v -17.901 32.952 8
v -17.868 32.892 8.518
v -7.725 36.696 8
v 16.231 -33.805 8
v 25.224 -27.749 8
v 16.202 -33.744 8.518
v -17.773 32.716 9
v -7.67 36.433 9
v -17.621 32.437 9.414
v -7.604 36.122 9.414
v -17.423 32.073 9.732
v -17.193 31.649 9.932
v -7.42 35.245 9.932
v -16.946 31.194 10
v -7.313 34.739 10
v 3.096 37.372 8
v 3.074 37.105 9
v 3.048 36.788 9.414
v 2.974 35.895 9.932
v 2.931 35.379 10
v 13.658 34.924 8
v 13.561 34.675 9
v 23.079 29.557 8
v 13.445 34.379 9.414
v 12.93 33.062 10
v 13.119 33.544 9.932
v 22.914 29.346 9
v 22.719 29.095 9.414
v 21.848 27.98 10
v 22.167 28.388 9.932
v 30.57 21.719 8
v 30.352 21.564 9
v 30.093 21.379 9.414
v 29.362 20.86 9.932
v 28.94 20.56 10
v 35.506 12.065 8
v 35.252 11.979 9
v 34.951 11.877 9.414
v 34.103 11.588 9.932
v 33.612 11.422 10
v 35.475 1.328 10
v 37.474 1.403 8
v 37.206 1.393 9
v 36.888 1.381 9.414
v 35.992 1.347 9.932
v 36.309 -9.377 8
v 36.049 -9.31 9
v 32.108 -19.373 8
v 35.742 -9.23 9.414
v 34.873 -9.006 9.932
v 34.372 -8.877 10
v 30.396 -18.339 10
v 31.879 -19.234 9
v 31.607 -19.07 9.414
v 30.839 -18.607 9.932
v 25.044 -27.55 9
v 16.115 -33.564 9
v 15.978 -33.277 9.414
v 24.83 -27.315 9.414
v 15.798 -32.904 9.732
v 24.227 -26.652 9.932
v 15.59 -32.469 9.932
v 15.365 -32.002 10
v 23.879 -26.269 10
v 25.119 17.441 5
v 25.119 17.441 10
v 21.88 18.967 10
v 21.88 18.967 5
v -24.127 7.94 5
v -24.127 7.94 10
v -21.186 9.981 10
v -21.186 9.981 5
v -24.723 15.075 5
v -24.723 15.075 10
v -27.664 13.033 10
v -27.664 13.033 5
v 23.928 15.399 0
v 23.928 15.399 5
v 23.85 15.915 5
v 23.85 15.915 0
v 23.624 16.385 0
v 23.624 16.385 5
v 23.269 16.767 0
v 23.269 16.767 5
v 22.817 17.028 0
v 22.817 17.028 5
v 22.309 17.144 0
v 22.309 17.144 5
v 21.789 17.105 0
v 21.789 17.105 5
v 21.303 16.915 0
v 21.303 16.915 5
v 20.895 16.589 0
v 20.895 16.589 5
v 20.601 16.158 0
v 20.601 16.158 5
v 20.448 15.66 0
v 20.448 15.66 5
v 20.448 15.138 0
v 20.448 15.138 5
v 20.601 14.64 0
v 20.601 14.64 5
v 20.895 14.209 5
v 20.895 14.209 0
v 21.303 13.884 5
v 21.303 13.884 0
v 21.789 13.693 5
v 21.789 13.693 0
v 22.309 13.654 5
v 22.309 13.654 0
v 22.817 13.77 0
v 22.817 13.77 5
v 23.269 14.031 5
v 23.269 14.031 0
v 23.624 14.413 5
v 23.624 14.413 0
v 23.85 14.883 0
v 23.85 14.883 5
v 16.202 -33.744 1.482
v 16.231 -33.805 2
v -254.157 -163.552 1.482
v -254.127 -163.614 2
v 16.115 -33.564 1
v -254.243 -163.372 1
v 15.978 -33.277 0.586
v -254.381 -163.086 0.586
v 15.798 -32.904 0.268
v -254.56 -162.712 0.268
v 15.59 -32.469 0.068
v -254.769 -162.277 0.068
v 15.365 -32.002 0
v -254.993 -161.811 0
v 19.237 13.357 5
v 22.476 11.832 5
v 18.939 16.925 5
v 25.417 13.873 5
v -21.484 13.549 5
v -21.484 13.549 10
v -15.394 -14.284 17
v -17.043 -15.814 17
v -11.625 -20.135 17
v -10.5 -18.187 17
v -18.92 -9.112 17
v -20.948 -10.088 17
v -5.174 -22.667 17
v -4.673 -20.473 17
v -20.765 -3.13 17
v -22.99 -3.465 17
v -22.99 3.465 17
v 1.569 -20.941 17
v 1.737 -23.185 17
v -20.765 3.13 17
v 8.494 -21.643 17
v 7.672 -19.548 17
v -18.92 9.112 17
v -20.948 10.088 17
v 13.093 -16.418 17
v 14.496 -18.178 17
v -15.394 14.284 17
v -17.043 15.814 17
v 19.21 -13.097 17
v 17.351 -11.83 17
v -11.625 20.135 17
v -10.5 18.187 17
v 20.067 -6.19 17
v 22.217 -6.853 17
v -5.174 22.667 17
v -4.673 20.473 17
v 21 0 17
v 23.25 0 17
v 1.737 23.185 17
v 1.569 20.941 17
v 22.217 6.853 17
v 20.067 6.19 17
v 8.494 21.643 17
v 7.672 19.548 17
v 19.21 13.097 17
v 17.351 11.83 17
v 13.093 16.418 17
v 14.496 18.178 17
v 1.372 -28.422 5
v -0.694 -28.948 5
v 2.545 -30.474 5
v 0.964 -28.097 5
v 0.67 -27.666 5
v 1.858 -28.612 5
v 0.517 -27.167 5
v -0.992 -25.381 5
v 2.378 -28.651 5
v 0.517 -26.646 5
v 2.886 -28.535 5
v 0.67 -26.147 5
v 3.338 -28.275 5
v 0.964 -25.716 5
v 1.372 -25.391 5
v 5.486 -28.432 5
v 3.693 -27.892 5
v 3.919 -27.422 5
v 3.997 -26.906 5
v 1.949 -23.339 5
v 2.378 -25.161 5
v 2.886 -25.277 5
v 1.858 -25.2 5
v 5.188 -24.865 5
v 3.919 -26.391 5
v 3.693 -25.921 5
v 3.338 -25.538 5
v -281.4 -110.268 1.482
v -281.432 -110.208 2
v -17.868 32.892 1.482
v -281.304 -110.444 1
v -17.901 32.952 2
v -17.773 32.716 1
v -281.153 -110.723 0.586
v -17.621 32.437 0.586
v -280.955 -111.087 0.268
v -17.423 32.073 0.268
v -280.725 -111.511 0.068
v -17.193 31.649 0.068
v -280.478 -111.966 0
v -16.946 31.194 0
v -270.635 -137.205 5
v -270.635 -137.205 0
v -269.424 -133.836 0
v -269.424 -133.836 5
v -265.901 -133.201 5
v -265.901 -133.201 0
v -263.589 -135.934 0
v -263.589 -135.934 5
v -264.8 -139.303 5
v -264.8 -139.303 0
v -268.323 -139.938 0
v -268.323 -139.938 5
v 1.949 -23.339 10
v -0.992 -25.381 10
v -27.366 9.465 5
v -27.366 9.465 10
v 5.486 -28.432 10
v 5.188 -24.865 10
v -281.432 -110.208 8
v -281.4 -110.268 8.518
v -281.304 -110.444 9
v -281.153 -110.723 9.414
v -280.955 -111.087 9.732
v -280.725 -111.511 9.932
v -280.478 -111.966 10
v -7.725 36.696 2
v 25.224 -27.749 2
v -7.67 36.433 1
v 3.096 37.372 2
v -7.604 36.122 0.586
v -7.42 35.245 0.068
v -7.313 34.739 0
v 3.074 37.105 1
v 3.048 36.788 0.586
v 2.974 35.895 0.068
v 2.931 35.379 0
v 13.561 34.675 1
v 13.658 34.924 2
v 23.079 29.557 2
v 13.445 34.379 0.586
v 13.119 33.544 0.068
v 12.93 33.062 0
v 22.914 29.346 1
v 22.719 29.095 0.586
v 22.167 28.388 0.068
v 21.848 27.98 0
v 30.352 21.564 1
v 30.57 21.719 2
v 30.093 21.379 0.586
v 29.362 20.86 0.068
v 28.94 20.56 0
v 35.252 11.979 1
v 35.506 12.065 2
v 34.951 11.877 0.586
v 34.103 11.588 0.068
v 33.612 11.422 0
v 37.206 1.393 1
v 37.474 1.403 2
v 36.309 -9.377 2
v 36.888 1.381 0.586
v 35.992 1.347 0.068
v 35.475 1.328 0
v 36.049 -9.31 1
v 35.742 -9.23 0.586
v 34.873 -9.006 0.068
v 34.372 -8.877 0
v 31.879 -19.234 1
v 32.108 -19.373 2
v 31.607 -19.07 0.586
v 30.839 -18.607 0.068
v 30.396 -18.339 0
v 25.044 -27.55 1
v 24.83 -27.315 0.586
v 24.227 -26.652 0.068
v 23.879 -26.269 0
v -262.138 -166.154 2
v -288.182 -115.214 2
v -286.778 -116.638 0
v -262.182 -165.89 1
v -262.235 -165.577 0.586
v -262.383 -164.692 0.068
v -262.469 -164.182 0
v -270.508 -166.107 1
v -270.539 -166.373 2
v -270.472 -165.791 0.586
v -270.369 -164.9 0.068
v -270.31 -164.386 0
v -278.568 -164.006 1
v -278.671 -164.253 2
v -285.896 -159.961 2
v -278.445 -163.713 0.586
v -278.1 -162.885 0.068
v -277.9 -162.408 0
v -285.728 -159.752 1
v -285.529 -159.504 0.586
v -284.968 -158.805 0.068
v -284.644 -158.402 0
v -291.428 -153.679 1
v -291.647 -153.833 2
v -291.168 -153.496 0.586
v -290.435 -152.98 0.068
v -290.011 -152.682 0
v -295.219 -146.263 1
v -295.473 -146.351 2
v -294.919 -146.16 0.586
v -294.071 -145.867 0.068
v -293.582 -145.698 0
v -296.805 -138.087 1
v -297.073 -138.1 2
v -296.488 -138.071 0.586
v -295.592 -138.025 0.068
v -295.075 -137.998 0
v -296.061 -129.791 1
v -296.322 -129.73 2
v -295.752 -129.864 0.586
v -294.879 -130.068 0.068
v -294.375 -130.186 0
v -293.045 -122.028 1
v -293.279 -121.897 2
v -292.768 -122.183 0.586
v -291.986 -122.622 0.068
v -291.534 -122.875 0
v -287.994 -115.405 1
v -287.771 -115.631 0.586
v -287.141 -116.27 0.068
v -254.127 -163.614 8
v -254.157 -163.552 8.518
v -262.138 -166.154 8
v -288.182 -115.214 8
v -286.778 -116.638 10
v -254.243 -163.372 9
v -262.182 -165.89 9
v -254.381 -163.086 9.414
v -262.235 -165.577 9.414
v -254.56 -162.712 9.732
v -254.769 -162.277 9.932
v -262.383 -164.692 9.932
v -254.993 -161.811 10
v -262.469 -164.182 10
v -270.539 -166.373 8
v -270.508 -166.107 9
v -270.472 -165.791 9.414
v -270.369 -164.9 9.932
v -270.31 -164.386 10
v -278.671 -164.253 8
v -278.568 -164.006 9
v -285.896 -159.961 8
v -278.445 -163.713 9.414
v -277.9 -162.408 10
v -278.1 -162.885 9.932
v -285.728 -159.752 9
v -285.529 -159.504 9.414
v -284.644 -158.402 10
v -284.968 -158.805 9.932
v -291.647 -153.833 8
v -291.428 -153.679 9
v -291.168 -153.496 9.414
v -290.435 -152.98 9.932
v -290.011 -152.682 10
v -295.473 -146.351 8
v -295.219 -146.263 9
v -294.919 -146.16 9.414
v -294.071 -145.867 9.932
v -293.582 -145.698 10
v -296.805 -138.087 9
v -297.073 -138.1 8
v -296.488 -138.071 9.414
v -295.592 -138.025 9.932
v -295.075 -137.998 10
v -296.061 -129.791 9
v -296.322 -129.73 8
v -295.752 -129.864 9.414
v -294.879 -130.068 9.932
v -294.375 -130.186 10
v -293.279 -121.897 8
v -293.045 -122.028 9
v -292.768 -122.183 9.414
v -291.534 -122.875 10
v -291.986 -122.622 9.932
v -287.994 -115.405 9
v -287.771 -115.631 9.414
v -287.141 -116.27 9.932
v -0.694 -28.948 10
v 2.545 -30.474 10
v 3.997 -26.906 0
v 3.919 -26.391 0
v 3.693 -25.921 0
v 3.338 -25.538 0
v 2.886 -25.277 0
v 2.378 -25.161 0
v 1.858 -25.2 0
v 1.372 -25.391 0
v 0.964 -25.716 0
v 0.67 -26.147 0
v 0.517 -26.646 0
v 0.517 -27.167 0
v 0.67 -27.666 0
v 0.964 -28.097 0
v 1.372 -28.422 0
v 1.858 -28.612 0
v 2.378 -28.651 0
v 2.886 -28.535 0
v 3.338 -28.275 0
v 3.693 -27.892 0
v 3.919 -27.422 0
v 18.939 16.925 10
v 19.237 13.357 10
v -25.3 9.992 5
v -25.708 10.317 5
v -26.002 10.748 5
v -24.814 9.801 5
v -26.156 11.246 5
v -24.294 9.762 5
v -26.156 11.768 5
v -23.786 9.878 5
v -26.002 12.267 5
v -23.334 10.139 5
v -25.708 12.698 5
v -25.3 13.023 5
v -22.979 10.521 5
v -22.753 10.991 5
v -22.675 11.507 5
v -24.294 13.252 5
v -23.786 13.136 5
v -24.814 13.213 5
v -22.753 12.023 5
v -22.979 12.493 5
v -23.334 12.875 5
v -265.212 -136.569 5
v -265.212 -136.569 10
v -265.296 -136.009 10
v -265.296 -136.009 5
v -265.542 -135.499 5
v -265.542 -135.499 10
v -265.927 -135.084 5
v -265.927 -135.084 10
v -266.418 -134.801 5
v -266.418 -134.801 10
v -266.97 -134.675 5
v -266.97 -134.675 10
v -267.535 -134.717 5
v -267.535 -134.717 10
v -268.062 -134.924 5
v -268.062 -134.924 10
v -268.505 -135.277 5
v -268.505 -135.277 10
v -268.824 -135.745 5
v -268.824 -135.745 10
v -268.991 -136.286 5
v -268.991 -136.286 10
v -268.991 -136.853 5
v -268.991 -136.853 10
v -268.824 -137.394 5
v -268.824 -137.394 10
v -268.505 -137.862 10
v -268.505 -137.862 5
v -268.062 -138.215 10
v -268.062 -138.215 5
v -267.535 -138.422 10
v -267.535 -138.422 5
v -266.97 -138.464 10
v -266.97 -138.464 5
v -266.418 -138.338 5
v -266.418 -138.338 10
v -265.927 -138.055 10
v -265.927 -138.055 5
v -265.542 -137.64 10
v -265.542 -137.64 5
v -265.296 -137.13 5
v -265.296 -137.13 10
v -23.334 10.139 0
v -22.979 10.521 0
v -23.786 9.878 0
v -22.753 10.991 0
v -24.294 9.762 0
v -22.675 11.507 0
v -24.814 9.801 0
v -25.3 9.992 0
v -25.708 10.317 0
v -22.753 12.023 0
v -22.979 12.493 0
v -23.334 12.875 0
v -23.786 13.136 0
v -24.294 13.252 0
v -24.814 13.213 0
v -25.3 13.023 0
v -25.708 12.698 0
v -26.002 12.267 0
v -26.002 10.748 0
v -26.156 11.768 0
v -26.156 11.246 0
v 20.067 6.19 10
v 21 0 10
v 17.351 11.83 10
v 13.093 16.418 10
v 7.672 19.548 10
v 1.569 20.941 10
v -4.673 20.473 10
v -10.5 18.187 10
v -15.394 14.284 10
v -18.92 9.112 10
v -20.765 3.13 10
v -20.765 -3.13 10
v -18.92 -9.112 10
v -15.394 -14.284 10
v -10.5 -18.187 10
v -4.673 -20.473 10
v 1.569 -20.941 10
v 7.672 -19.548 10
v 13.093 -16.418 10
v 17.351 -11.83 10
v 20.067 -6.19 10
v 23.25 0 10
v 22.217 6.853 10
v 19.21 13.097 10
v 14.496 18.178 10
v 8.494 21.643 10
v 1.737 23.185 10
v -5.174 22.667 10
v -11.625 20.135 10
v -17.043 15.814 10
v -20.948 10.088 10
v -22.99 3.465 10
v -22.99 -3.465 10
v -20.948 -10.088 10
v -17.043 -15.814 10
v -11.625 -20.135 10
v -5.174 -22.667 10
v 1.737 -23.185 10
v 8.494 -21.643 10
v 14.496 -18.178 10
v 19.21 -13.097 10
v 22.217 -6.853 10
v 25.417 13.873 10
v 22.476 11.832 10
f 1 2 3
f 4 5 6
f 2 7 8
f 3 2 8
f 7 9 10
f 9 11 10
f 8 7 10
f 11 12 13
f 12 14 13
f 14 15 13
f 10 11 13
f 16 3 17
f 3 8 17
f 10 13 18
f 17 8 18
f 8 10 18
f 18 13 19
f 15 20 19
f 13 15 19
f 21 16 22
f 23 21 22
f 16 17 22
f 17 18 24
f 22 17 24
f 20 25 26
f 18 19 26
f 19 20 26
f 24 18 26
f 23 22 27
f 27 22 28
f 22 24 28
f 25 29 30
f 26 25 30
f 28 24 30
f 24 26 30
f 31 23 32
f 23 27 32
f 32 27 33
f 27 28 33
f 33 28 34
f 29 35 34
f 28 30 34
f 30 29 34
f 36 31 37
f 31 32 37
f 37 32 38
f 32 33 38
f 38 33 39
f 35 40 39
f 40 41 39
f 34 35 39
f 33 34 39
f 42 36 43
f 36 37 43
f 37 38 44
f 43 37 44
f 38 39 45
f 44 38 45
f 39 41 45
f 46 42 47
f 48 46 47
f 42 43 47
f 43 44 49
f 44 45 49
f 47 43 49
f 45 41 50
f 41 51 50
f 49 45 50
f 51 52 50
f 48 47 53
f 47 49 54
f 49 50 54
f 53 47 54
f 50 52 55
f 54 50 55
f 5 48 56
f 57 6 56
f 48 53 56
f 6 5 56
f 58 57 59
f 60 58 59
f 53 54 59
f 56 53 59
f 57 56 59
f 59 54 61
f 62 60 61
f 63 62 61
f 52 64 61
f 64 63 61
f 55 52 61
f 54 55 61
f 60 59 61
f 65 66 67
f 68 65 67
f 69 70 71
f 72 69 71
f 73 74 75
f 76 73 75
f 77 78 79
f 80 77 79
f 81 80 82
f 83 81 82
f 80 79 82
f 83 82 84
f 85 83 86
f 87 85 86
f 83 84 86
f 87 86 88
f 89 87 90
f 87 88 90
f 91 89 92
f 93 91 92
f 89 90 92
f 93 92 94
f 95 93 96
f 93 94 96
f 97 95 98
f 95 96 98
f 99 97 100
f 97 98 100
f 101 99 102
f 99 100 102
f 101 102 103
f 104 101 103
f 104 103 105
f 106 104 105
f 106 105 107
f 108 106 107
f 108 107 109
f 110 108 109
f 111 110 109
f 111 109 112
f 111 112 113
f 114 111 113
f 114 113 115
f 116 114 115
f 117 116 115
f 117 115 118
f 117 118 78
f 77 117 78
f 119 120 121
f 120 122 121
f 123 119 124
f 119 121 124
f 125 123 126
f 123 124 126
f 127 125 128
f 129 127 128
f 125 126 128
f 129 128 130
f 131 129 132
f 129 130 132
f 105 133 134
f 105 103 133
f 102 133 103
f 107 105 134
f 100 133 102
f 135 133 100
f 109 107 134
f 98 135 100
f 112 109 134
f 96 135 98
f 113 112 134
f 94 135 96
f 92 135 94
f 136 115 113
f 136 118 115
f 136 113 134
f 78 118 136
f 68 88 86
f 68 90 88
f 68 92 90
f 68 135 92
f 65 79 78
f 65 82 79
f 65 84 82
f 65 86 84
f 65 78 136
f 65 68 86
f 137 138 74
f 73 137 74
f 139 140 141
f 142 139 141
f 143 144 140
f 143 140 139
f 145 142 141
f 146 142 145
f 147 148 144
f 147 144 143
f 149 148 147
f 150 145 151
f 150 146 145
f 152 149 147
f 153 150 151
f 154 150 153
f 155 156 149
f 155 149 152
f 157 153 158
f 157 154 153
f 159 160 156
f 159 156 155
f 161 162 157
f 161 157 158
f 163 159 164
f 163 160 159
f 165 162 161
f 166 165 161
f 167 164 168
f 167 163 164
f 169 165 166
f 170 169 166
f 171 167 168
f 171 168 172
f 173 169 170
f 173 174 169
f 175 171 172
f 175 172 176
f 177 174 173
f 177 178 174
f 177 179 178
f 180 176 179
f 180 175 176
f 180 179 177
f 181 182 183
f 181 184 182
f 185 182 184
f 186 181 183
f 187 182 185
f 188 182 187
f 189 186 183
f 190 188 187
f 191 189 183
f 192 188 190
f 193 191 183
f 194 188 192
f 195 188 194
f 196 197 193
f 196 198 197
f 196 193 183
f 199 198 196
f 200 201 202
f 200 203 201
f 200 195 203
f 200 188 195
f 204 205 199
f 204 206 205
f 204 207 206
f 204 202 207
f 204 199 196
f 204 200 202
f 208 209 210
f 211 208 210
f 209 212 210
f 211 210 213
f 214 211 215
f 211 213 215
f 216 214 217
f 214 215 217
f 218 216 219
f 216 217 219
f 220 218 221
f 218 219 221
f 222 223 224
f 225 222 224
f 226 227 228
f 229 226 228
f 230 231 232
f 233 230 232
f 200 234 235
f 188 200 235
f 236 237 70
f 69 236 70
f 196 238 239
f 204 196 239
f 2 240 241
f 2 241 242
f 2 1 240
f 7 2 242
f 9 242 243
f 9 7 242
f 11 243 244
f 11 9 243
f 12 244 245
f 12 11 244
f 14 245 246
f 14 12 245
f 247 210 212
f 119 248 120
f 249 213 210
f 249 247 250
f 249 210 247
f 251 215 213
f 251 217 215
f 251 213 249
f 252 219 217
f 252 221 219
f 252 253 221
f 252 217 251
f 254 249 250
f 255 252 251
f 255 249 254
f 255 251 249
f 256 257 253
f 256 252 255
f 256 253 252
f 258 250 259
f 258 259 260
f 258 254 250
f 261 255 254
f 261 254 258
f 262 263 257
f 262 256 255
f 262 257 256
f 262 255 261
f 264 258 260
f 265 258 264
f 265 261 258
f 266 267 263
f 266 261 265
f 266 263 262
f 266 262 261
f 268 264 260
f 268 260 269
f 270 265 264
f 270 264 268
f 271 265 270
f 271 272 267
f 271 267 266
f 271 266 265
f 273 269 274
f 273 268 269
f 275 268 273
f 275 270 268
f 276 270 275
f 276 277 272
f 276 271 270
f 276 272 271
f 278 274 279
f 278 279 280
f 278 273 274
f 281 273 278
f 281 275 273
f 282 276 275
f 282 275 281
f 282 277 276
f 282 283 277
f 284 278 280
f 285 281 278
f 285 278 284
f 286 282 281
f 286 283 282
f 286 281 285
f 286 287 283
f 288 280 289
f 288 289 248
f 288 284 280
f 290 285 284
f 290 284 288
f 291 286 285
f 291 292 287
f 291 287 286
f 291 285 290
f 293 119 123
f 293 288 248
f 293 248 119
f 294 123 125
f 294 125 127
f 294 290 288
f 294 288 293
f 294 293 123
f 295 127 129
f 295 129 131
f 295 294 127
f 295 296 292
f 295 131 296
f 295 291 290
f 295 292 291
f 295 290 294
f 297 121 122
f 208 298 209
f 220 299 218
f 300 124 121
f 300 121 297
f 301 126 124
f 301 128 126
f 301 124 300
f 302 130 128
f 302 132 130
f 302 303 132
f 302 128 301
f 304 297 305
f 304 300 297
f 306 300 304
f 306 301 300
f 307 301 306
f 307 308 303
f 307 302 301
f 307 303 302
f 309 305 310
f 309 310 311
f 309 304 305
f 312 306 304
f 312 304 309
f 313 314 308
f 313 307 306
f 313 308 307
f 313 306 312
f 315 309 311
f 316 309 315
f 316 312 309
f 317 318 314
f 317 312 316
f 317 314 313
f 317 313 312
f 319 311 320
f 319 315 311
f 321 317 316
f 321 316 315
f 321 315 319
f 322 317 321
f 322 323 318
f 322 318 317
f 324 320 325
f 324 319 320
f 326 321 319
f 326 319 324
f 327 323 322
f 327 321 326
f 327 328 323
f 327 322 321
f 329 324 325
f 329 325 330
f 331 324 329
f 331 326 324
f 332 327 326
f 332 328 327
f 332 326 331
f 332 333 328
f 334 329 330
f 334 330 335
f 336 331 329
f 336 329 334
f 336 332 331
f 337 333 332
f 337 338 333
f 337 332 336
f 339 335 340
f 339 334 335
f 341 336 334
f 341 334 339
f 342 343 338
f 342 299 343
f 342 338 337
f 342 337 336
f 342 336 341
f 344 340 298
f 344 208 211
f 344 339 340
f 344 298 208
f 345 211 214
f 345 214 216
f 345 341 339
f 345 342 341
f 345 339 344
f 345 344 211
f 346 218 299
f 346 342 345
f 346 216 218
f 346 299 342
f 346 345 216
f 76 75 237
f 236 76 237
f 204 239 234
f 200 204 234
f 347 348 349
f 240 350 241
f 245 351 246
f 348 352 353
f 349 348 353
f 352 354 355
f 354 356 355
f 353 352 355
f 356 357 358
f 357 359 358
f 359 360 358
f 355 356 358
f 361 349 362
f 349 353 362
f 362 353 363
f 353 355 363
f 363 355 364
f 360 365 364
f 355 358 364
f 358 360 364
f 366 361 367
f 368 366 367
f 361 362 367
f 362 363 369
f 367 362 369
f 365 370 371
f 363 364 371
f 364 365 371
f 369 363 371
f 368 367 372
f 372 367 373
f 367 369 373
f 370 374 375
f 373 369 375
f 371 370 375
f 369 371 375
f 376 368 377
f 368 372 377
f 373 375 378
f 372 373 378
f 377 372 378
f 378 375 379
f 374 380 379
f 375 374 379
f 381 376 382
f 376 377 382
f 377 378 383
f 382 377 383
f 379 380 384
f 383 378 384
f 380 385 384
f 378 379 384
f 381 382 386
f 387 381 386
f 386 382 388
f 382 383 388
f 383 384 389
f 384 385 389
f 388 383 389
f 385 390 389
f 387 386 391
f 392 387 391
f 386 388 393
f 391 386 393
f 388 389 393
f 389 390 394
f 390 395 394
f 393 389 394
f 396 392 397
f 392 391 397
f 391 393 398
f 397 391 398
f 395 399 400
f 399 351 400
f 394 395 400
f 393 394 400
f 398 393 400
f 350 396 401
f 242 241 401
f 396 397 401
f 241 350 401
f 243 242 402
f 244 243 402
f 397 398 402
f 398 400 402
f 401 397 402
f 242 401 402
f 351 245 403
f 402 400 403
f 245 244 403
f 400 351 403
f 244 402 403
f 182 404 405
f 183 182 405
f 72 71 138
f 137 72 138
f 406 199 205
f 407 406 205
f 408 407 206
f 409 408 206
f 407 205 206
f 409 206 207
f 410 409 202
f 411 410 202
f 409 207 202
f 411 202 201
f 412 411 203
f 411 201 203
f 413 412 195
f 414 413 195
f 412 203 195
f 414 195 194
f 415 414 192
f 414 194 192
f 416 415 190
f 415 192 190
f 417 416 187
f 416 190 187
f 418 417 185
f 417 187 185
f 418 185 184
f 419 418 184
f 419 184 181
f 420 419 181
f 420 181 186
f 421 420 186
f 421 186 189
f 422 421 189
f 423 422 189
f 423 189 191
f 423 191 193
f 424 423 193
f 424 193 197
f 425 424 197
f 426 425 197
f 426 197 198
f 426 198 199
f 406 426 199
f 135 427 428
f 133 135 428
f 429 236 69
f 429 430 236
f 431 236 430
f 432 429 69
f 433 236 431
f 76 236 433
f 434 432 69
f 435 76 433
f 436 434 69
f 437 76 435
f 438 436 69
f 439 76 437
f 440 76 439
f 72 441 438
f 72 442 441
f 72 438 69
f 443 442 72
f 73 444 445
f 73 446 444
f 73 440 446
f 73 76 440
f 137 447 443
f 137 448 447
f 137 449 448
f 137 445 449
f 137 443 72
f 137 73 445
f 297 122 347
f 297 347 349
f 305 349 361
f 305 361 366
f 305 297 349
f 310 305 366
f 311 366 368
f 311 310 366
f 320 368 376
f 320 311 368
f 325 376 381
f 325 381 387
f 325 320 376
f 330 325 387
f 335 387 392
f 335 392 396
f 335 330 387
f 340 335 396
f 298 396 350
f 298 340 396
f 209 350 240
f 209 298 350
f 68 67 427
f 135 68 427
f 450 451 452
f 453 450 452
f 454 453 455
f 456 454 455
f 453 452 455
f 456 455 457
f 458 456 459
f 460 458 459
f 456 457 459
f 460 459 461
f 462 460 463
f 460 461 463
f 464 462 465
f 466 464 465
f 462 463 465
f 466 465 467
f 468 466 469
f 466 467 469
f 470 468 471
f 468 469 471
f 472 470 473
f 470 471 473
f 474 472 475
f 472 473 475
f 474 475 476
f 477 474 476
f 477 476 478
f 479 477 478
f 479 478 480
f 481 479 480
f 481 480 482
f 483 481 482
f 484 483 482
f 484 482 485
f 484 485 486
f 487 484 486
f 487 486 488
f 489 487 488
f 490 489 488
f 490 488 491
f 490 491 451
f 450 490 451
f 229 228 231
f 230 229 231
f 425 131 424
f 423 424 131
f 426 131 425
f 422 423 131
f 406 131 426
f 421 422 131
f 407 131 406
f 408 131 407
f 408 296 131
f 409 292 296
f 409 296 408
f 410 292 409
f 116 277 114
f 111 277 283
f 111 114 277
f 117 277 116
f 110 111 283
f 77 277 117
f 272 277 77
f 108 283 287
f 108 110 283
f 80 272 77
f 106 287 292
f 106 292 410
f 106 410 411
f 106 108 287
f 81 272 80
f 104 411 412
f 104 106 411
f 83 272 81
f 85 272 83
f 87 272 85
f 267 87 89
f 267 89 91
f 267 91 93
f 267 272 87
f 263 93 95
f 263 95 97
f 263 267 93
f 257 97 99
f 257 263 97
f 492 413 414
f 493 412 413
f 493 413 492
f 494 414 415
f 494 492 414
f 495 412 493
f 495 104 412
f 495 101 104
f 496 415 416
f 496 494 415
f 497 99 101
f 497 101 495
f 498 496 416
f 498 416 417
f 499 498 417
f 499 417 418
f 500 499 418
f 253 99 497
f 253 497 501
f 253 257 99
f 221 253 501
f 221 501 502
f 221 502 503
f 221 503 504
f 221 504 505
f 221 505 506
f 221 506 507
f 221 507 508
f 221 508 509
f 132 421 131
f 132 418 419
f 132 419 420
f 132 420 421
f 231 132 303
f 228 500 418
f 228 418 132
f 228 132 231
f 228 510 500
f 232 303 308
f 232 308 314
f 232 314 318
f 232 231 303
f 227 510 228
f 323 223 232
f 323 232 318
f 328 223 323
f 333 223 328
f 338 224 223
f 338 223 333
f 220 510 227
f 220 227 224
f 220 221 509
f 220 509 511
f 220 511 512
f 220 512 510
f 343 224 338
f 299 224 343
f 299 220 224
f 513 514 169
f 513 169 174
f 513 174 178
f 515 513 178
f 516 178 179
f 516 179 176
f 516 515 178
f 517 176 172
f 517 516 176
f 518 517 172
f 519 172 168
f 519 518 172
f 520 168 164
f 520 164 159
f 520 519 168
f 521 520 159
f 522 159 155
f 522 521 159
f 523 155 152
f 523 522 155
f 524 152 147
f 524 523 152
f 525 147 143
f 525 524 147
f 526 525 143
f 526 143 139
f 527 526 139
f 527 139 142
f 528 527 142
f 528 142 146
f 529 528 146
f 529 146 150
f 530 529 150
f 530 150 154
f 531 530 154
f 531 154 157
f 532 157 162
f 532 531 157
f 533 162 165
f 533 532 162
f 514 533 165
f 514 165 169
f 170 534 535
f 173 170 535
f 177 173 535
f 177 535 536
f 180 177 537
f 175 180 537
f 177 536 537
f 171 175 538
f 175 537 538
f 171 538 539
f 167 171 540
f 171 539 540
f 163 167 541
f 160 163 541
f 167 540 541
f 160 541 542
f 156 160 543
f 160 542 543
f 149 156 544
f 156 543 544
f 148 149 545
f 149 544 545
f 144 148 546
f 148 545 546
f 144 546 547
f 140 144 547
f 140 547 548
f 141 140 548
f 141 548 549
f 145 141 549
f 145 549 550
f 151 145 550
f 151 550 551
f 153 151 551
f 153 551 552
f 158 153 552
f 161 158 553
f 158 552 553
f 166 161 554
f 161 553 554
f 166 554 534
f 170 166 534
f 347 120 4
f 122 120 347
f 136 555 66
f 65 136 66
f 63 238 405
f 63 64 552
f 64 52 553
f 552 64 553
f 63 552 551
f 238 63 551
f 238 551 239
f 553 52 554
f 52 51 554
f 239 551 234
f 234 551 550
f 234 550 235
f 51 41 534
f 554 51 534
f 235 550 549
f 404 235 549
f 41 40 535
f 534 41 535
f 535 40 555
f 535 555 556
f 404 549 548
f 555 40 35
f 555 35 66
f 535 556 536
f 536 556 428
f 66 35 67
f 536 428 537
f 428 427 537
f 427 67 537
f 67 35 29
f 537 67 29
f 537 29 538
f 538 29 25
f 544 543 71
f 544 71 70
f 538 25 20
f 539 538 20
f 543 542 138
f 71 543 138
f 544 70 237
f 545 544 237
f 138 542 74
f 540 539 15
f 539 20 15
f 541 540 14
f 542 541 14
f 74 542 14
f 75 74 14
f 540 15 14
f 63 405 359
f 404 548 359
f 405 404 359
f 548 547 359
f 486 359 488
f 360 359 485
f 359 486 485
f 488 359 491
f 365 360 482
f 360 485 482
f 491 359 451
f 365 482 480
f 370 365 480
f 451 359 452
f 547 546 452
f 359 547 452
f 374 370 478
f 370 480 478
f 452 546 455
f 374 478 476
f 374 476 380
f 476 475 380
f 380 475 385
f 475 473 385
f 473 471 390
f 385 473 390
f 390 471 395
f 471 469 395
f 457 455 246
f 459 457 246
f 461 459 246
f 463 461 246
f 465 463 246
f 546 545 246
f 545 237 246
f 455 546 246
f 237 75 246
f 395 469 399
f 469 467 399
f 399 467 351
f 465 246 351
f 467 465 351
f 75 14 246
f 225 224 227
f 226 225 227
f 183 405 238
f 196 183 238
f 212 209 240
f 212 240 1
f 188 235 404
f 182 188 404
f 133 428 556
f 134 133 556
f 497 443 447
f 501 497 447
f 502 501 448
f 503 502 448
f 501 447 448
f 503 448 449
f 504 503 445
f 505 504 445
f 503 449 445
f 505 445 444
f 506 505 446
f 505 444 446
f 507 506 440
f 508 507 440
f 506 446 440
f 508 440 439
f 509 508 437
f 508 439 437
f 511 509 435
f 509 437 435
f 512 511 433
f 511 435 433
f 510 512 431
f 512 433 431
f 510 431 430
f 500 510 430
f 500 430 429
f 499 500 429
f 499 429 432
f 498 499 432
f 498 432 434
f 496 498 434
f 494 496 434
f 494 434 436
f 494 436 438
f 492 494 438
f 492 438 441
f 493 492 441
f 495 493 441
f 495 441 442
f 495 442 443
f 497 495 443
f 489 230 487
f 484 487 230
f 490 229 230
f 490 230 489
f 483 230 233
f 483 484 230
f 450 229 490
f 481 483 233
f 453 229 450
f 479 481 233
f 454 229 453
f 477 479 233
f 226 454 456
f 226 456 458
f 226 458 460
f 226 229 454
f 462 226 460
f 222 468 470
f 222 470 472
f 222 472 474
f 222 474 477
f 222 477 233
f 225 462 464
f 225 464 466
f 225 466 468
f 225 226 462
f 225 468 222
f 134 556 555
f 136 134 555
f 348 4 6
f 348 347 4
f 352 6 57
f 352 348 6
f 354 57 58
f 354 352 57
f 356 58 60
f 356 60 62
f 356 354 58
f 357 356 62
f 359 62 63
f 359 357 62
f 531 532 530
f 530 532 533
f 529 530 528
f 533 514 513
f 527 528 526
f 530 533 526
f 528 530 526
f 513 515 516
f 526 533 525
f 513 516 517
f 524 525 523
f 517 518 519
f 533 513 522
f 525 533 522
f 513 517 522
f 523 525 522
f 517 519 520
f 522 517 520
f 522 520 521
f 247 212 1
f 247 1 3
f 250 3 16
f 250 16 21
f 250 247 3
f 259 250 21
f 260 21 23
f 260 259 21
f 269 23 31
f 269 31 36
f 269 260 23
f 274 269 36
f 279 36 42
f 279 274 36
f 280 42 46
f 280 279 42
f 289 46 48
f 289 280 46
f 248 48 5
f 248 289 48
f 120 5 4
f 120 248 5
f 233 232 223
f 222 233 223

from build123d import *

# Parameters (mm, degrees)
BOSS_EXTRUDE1_DEPTH = 10
FILLET1_R           = 2
SKETCH3_R           = 1.9
CUT_EXTRUDE3_DEPTH  = 240
CUT_EXTRUDE4_DEPTH  = 5
SKETCH6_R           = 1.75
CUT_EXTRUDE8_DEPTH  = 10
SKETCH7_R           = 23.25
SKETCH7_R_2         = 21
BOSS_EXTRUDE2_DEPTH = 7
CUT_EXTRUDE9_DEPTH  = 5


with BuildPart() as part:
    # Sketch1 → Boss-Extrude1 (new body)
    with BuildSketch(Plane.XY):
        with BuildLine():
            Line((-281.432373232, -110.20807274), (-17.900575614, 32.951773741))
            ThreePointArc((-17.900575614, 32.951773741), (33.388989093, 17.071186467), (16.23112616, -33.805333064))
            Line((16.23112616, -33.805333064), (-254.127011813, -163.613758184))
            ThreePointArc((-254.127011813, -163.613758184), (-293.823104015, -150.226440906), (-281.432373232, -110.20807274))
        make_face()
    extrude(amount=BOSS_EXTRUDE1_DEPTH)

    # Fillet1
    fillet1_edges = [part.edges().sort_by_distance(p)[0] for p in [
        (33.388989093, 17.071186467, 10),
        (-149.666474423, -38.628149499, 10),
        (-293.823104015, -150.226440906, 10),
        (-149.666474423, -38.628149499, 0),
        (33.388989093, 17.071186467, 0),
        (-118.947942827, -98.709545624, 0),
        (-293.823104015, -150.226440906, 0),
        (-118.947942827, -98.709545624, 10),
    ]]
    fillet(fillet1_edges, radius=FILLET1_R)

    # Sketch3 → Cut-Extrude3 (cut)
    with BuildSketch(Plane.XY.offset(10)):
        with Locations((-267.111912741, -136.569491732)):
            Circle(SKETCH3_R)
    extrude(amount=-CUT_EXTRUDE3_DEPTH, mode=Mode.SUBTRACT)

    # Sketch4 → Cut-Extrude4 (cut)
    with BuildSketch(Plane.XY.offset(10)):
        Polygon((1.949051074, -23.338757463), (-0.99159812, -25.380566053), (-0.693664608, -28.948147254), (2.544918098, -30.473919864), (5.485567292, -28.432111274), (5.18763378, -24.864530073), align=None)
        Polygon((19.237431318, 13.357306475), (22.476014024, 11.831533865), (25.416663218, 13.873342455), (25.118729706, 17.440923655), (21.880147001, 18.966696266), (18.939497807, 16.924887676), align=None)
        Polygon((-21.186482393, 9.981450988), (-21.484415905, 13.549032188), (-24.72299861, 15.074804799), (-27.663647804, 13.032996209), (-27.365714292, 9.465415008), (-24.127131587, 7.939642398), align=None)
    extrude(amount=-CUT_EXTRUDE4_DEPTH, mode=Mode.SUBTRACT)

    # Sketch6 → Cut-Extrude8 (cut)
    with BuildSketch(Plane.XY.offset(10)):
        with Locations((2.246984586, -26.906338663)):
            Circle(SKETCH6_R)
        with Locations((-24.425065098, 11.507223598)):
            Circle(SKETCH6_R)
        with Locations((22.178080512, 15.399115065)):
            Circle(SKETCH6_R)
    extrude(amount=-CUT_EXTRUDE8_DEPTH, mode=Mode.SUBTRACT)

    # Sketch7 → Boss-Extrude2 (add)
    with BuildSketch(Plane.XY.offset(10)):
        Circle(SKETCH7_R)
        Circle(SKETCH7_R_2, mode=Mode.SUBTRACT)
    extrude(amount=BOSS_EXTRUDE2_DEPTH)

    # Sketch8 → Cut-Extrude9 (cut)
    with BuildSketch(Plane(origin=(0, 0, 0), x_dir=(-1, 0, 0), z_dir=(0, 0, -1))):
        Polygon((270.635063904, -137.204948955), (269.42381042, -133.836081935), (265.900659257, -133.200624712), (263.588761578, -135.93403451), (264.800015061, -139.30290153), (268.323166224, -139.938358752), align=None)
    extrude(amount=-CUT_EXTRUDE9_DEPTH, mode=Mode.SUBTRACT)


solid = part.part
